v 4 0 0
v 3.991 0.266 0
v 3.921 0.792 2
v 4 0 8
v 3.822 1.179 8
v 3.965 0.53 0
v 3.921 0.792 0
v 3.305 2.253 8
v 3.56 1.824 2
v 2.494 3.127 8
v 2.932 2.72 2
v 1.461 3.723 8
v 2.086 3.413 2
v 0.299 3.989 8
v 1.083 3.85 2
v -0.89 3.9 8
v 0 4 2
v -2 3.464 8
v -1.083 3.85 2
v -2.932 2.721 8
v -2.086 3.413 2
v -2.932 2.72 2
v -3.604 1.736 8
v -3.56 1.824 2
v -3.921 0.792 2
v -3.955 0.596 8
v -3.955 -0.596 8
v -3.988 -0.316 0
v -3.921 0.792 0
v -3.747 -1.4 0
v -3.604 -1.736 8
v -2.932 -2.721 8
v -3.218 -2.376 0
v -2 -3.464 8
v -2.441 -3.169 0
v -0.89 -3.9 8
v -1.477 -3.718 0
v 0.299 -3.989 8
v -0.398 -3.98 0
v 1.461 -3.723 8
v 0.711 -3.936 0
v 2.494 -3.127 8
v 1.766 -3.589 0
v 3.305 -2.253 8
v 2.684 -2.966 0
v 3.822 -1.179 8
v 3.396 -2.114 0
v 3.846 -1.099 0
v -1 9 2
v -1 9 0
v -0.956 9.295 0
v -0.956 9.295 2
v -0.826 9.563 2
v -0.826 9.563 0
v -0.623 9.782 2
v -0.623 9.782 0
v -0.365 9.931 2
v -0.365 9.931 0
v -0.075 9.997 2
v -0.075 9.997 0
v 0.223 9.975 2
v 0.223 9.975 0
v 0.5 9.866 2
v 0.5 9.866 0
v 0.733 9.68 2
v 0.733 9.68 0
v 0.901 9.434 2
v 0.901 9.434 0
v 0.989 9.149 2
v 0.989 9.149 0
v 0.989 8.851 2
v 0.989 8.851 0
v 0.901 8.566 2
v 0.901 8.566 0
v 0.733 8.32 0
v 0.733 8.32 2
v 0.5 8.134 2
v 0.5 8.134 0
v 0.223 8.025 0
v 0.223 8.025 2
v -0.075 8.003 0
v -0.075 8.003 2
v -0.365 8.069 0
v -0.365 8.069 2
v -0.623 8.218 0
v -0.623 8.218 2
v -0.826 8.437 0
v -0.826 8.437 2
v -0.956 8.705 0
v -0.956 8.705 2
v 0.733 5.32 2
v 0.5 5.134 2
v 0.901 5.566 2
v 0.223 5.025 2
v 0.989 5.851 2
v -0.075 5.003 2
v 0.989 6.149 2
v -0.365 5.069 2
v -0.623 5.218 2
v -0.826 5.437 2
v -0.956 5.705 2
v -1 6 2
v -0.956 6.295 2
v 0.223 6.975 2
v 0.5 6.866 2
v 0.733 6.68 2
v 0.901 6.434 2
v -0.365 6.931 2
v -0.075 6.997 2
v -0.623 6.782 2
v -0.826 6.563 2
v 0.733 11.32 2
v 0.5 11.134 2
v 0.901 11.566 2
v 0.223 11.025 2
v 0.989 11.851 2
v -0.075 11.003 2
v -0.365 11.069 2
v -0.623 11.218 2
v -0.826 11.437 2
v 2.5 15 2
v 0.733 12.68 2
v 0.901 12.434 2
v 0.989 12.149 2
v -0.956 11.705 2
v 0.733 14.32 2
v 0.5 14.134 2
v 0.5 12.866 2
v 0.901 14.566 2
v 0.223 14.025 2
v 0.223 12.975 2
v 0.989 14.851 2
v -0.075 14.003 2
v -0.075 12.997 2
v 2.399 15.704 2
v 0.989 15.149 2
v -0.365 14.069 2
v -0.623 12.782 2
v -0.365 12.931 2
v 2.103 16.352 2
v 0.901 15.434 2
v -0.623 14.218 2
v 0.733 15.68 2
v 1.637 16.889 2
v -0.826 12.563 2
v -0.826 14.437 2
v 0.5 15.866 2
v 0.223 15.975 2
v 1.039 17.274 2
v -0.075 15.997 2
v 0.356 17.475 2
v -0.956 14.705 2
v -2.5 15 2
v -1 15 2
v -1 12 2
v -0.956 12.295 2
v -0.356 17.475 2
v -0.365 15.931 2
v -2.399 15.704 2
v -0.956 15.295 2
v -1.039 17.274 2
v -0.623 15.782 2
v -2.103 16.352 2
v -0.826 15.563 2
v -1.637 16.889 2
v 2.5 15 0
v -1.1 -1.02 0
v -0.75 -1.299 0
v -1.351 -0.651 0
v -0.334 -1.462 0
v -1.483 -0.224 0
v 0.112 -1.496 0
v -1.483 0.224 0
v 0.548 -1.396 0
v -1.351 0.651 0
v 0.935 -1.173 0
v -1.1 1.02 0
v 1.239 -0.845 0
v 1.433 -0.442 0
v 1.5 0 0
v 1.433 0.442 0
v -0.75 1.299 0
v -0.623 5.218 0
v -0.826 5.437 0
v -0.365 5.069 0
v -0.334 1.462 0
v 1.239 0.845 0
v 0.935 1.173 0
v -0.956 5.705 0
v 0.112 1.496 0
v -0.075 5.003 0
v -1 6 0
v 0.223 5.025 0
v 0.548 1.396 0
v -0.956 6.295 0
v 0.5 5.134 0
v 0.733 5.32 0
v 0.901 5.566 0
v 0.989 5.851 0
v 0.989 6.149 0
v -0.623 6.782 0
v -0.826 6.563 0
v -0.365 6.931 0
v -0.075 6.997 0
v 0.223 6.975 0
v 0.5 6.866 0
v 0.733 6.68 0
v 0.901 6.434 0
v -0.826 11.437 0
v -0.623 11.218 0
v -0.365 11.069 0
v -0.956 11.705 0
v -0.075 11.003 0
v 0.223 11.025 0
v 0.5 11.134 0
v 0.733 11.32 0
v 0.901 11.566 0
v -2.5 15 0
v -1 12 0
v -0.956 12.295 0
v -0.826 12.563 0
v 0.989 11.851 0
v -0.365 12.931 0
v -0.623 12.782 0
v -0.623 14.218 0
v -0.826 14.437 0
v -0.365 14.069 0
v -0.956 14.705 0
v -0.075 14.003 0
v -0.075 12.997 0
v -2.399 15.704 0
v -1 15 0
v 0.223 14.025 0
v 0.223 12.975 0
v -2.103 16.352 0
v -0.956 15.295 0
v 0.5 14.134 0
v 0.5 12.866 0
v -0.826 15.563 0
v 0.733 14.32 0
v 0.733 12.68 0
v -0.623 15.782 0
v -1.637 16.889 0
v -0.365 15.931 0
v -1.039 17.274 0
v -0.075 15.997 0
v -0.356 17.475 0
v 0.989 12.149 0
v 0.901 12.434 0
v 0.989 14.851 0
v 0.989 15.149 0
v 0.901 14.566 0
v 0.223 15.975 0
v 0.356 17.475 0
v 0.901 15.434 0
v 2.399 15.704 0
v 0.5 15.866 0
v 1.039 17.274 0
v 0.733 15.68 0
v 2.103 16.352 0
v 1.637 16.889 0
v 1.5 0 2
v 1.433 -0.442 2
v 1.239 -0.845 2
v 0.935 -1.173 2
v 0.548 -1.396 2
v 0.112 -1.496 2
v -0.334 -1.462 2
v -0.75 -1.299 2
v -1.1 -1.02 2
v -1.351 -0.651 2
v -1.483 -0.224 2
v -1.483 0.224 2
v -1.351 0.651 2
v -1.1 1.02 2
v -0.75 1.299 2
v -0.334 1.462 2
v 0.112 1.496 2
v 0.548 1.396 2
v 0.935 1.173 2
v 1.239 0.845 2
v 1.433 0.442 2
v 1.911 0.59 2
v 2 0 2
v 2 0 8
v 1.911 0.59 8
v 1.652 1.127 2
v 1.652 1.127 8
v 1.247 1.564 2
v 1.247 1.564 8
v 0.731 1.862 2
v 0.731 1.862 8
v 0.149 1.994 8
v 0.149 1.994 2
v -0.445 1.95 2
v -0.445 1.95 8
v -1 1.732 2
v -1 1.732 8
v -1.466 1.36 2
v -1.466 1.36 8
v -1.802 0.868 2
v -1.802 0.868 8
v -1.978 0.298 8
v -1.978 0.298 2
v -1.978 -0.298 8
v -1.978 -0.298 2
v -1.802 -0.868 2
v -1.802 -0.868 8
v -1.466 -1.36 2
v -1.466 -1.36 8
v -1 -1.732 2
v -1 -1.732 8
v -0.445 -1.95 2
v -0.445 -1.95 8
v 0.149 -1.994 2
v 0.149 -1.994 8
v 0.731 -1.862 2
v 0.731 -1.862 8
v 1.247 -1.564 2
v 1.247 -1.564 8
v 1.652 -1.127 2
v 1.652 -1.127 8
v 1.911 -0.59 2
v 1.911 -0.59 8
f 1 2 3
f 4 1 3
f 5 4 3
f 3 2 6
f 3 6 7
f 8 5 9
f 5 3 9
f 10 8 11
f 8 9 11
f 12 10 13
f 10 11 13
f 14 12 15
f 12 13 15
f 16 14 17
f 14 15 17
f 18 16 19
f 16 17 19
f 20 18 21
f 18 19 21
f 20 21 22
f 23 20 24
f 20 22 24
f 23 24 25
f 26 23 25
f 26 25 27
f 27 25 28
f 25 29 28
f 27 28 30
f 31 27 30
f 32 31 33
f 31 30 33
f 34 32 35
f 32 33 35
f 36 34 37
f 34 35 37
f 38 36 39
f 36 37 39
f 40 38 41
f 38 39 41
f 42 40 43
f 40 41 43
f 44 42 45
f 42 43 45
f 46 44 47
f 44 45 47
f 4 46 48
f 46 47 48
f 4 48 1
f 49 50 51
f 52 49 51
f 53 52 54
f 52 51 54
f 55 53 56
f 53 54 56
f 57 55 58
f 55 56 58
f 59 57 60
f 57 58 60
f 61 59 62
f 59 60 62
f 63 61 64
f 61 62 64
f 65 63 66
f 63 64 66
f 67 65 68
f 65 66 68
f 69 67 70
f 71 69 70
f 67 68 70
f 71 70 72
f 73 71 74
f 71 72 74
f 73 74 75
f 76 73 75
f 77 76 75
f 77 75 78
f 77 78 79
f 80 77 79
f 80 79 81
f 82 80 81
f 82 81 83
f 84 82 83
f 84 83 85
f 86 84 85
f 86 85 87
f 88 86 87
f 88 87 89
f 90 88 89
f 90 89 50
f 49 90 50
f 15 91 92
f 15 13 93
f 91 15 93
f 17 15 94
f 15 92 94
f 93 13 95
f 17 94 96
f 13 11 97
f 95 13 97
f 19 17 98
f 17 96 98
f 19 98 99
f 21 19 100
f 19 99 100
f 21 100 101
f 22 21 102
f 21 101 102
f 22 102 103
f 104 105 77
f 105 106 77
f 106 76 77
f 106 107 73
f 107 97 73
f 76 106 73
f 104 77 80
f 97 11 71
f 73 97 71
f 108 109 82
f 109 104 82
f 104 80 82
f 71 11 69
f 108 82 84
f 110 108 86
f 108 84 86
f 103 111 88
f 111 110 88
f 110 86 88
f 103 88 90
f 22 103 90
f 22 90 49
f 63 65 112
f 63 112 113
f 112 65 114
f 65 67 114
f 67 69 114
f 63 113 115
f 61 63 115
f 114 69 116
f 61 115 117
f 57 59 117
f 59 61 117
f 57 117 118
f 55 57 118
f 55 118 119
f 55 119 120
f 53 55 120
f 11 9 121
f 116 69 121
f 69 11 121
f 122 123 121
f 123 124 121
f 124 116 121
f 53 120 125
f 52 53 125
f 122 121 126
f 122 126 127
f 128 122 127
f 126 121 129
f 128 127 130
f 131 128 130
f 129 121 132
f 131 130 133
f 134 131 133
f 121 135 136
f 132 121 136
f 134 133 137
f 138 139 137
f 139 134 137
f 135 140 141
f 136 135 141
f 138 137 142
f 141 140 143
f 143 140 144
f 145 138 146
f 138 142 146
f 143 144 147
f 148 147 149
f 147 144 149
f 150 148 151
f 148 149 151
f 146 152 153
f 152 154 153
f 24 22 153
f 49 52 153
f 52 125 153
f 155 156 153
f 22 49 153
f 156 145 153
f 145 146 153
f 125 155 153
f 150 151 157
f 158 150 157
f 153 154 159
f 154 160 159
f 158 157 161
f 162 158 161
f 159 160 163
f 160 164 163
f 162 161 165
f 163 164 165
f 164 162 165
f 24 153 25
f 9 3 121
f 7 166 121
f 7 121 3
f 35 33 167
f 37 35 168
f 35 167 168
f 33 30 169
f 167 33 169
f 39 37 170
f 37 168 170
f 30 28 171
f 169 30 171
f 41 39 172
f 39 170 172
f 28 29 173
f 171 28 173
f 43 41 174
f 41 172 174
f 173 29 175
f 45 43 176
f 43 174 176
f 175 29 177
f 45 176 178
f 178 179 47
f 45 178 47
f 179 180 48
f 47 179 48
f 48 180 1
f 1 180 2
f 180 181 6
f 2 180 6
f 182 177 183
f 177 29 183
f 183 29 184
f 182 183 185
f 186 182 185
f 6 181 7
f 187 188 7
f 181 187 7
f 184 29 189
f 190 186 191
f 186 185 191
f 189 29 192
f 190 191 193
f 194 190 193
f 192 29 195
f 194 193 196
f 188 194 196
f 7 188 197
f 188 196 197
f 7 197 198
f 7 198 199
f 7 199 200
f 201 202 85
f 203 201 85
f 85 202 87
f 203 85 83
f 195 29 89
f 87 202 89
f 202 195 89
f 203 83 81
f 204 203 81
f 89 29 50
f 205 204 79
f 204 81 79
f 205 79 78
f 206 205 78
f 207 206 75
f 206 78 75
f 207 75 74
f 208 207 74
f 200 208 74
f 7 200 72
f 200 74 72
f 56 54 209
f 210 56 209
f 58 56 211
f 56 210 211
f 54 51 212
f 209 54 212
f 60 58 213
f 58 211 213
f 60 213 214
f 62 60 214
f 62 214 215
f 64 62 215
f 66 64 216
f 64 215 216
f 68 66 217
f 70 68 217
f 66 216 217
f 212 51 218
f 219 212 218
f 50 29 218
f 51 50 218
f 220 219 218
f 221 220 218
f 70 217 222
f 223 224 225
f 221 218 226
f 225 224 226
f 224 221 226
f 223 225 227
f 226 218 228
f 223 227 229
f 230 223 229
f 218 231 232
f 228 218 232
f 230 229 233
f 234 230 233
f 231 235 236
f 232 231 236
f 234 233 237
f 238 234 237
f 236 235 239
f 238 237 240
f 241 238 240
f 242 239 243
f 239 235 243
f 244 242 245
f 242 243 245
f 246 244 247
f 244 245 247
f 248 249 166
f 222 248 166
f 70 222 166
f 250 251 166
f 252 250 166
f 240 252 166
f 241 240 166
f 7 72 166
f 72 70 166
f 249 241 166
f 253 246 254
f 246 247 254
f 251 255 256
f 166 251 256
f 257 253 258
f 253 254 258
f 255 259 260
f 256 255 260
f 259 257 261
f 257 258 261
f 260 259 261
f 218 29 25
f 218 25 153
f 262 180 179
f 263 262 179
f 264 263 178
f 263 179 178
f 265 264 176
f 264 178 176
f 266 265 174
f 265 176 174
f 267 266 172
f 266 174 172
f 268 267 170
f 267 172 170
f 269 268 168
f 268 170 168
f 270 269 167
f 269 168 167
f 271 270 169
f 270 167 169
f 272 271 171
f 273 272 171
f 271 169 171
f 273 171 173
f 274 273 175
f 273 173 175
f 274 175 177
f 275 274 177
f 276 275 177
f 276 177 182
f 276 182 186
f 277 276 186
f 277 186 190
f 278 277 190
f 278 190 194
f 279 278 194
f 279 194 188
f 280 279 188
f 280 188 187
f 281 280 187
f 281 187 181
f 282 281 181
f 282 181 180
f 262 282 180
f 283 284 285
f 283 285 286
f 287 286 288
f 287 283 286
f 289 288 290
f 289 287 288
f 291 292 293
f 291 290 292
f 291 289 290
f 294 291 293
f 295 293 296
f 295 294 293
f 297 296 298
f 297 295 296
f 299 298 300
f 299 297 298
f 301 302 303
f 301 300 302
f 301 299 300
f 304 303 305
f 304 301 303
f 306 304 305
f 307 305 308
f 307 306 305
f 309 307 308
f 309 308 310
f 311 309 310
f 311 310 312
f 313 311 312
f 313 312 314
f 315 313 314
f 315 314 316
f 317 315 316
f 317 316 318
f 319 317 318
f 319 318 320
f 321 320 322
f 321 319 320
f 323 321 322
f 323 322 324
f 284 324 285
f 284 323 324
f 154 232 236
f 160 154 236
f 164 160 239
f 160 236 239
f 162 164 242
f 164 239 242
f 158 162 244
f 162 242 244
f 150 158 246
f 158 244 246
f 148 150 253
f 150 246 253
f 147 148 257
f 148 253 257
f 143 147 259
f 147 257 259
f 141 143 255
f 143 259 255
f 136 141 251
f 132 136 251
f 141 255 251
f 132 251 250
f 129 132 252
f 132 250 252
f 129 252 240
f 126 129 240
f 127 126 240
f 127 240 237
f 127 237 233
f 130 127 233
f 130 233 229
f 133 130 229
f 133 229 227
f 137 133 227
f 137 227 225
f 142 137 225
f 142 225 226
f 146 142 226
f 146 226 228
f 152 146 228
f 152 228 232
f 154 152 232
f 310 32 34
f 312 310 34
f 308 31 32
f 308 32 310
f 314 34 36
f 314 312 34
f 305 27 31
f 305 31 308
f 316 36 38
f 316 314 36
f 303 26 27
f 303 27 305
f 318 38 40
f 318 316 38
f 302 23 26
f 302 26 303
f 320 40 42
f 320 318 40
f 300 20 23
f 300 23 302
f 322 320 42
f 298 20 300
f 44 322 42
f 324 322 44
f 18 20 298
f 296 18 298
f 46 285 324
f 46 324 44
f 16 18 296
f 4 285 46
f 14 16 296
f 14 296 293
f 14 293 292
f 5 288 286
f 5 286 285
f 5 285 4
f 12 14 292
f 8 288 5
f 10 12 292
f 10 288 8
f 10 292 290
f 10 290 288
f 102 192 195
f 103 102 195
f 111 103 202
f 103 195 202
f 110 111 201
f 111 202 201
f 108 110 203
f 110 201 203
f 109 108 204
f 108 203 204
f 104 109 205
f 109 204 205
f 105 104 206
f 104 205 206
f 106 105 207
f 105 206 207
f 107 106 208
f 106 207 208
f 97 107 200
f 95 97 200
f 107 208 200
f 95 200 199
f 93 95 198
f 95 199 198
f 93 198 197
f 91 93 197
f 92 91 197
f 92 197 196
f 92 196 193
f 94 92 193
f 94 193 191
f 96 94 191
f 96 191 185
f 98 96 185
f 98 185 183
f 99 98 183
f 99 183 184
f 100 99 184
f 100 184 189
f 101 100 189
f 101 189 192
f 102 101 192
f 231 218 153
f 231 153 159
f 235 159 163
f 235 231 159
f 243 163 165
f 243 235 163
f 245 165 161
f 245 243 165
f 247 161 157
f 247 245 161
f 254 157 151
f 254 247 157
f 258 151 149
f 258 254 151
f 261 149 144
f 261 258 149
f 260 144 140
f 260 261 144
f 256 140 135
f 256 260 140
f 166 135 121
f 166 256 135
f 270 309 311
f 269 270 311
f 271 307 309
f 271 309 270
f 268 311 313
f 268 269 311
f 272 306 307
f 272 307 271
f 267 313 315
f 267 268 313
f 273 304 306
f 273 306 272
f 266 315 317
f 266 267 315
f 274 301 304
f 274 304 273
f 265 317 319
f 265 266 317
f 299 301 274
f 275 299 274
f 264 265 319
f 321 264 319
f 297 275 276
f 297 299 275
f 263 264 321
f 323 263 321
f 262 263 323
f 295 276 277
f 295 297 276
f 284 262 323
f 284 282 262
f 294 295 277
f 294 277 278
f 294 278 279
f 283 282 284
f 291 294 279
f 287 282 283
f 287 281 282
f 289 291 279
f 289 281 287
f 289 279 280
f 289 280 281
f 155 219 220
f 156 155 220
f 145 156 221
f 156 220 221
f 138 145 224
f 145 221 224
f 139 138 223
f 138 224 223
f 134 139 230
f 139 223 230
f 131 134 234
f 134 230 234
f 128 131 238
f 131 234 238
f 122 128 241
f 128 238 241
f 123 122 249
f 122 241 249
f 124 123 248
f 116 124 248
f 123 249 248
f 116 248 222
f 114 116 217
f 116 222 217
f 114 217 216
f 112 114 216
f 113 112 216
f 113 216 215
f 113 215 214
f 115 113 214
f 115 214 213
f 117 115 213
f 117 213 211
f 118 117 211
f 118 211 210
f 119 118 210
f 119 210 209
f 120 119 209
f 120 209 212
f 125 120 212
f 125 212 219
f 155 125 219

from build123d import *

# Parameters (mm, degrees)
SCHIZZO1_R                           = 4
ESTRUSIONE_ESTRUSIONE1_DEPTH         = 8
SVUOTA1_T                            = -2
ESTRUSIONE_ESTRUSIONE3_DEPTH         = 2
TAGLIO_ESTRUSIONE2_REACH             = 21.653
SCHIZZO4_R                           = 1
TAGLIO_ESTRUSIONE1_REACH             = 21.653
SCHIZZO2_R                           = 1.5
TAGLIO_ESTRUSIONE1_DIRECTION_2_DEPTH = 10


with BuildPart() as part:
    # Schizzo1 → Estrusione-Estrusione1 (new body)
    with BuildSketch(Plane.XY):
        Circle(SCHIZZO1_R)
    extrude(amount=ESTRUSIONE_ESTRUSIONE1_DEPTH)

    # Svuota1
    svuota1_openings = [part.faces().sort_by_distance(p)[0] for p in [
        (0, 0, 8),
    ]]
    offset(amount=SVUOTA1_T, openings=svuota1_openings, kind=Kind.INTERSECTION)

    # Schizzo5 → Estrusione-Estrusione3 (add)
    with BuildSketch(Plane(origin=(0, 0, 0), x_dir=(-1, 0, 0), z_dir=(0, 0, -1))):
        with BuildLine():
            ThreePointArc((-3.920792079, 0.792079208), (0, 4), (3.920792079, 0.792079208))
            Line((3.920792079, 0.792079208), (2.5, 15))
            ThreePointArc((2.5, 15), (0, 17.5), (-2.5, 15))
            Line((-2.5, 15), (-3.920792079, 0.792079208))
        make_face()
    extrude(amount=-ESTRUSIONE_ESTRUSIONE3_DEPTH)

    # Schizzo4 → Taglio-Estrusione2 (cut, up to next)
    with BuildSketch(Plane(origin=(0, 0, 0), x_dir=(-1, 0, 0), z_dir=(0, 0, -1)), mode=Mode.PRIVATE) as taglio_estrusione2_sk1:
        with Locations((0, 6)):
            Circle(SCHIZZO4_R)
    taglio_estrusione2_tool1 = extrude(taglio_estrusione2_sk1.sketch, amount=-TAGLIO_ESTRUSIONE2_REACH, mode=Mode.PRIVATE) & part.part
    # Schizzo4 → Taglio-Estrusione2 (cut, up to next)
    with BuildSketch(Plane(origin=(0, 0, 0), x_dir=(-1, 0, 0), z_dir=(0, 0, -1)), mode=Mode.PRIVATE) as taglio_estrusione2_sk2:
        with Locations((0, 9)):
            Circle(SCHIZZO4_R)
    taglio_estrusione2_tool2 = extrude(taglio_estrusione2_sk2.sketch, amount=-TAGLIO_ESTRUSIONE2_REACH, mode=Mode.PRIVATE) & part.part
    # Schizzo4 → Taglio-Estrusione2 (cut, up to next)
    with BuildSketch(Plane(origin=(0, 0, 0), x_dir=(-1, 0, 0), z_dir=(0, 0, -1)), mode=Mode.PRIVATE) as taglio_estrusione2_sk3:
        with Locations((0, 12)):
            Circle(SCHIZZO4_R)
    taglio_estrusione2_tool3 = extrude(taglio_estrusione2_sk3.sketch, amount=-TAGLIO_ESTRUSIONE2_REACH, mode=Mode.PRIVATE) & part.part
    # Schizzo4 → Taglio-Estrusione2 (cut, up to next)
    with BuildSketch(Plane(origin=(0, 0, 0), x_dir=(-1, 0, 0), z_dir=(0, 0, -1)), mode=Mode.PRIVATE) as taglio_estrusione2_sk4:
        with Locations((0, 15)):
            Circle(SCHIZZO4_R)
    taglio_estrusione2_tool4 = extrude(taglio_estrusione2_sk4.sketch, amount=-TAGLIO_ESTRUSIONE2_REACH, mode=Mode.PRIVATE) & part.part
    add(taglio_estrusione2_tool1.solids().sort_by_distance((0, 6, 0))[0], mode=Mode.SUBTRACT)
    add(taglio_estrusione2_tool2.solids().sort_by_distance((0, 9, 0))[0], mode=Mode.SUBTRACT)
    add(taglio_estrusione2_tool3.solids().sort_by_distance((0, 12, 0))[0], mode=Mode.SUBTRACT)
    add(taglio_estrusione2_tool4.solids().sort_by_distance((0, 15, 0))[0], mode=Mode.SUBTRACT)

    # Schizzo2 → Taglio-Estrusione1 (cut, up to next)
    with BuildSketch(Plane(origin=(0, 0, 0), x_dir=(-1, 0, 0), z_dir=(0, 0, -1)), mode=Mode.PRIVATE) as taglio_estrusione1_sk1:
        Circle(SCHIZZO2_R)
    taglio_estrusione1_tool1 = extrude(taglio_estrusione1_sk1.sketch, amount=-TAGLIO_ESTRUSIONE1_REACH, mode=Mode.PRIVATE) & part.part
    add(taglio_estrusione1_tool1.solids().sort_by_distance((0, 0, 0))[0], mode=Mode.SUBTRACT)

    # Schizzo2 → Taglio-Estrusione1 direction 2 (cut)
    with BuildSketch(Plane(origin=(0, 0, 0), x_dir=(-1, 0, 0), z_dir=(0, 0, -1))):
        Circle(SCHIZZO2_R)
    extrude(amount=TAGLIO_ESTRUSIONE1_DIRECTION_2_DEPTH, mode=Mode.SUBTRACT)


solid = part.part
